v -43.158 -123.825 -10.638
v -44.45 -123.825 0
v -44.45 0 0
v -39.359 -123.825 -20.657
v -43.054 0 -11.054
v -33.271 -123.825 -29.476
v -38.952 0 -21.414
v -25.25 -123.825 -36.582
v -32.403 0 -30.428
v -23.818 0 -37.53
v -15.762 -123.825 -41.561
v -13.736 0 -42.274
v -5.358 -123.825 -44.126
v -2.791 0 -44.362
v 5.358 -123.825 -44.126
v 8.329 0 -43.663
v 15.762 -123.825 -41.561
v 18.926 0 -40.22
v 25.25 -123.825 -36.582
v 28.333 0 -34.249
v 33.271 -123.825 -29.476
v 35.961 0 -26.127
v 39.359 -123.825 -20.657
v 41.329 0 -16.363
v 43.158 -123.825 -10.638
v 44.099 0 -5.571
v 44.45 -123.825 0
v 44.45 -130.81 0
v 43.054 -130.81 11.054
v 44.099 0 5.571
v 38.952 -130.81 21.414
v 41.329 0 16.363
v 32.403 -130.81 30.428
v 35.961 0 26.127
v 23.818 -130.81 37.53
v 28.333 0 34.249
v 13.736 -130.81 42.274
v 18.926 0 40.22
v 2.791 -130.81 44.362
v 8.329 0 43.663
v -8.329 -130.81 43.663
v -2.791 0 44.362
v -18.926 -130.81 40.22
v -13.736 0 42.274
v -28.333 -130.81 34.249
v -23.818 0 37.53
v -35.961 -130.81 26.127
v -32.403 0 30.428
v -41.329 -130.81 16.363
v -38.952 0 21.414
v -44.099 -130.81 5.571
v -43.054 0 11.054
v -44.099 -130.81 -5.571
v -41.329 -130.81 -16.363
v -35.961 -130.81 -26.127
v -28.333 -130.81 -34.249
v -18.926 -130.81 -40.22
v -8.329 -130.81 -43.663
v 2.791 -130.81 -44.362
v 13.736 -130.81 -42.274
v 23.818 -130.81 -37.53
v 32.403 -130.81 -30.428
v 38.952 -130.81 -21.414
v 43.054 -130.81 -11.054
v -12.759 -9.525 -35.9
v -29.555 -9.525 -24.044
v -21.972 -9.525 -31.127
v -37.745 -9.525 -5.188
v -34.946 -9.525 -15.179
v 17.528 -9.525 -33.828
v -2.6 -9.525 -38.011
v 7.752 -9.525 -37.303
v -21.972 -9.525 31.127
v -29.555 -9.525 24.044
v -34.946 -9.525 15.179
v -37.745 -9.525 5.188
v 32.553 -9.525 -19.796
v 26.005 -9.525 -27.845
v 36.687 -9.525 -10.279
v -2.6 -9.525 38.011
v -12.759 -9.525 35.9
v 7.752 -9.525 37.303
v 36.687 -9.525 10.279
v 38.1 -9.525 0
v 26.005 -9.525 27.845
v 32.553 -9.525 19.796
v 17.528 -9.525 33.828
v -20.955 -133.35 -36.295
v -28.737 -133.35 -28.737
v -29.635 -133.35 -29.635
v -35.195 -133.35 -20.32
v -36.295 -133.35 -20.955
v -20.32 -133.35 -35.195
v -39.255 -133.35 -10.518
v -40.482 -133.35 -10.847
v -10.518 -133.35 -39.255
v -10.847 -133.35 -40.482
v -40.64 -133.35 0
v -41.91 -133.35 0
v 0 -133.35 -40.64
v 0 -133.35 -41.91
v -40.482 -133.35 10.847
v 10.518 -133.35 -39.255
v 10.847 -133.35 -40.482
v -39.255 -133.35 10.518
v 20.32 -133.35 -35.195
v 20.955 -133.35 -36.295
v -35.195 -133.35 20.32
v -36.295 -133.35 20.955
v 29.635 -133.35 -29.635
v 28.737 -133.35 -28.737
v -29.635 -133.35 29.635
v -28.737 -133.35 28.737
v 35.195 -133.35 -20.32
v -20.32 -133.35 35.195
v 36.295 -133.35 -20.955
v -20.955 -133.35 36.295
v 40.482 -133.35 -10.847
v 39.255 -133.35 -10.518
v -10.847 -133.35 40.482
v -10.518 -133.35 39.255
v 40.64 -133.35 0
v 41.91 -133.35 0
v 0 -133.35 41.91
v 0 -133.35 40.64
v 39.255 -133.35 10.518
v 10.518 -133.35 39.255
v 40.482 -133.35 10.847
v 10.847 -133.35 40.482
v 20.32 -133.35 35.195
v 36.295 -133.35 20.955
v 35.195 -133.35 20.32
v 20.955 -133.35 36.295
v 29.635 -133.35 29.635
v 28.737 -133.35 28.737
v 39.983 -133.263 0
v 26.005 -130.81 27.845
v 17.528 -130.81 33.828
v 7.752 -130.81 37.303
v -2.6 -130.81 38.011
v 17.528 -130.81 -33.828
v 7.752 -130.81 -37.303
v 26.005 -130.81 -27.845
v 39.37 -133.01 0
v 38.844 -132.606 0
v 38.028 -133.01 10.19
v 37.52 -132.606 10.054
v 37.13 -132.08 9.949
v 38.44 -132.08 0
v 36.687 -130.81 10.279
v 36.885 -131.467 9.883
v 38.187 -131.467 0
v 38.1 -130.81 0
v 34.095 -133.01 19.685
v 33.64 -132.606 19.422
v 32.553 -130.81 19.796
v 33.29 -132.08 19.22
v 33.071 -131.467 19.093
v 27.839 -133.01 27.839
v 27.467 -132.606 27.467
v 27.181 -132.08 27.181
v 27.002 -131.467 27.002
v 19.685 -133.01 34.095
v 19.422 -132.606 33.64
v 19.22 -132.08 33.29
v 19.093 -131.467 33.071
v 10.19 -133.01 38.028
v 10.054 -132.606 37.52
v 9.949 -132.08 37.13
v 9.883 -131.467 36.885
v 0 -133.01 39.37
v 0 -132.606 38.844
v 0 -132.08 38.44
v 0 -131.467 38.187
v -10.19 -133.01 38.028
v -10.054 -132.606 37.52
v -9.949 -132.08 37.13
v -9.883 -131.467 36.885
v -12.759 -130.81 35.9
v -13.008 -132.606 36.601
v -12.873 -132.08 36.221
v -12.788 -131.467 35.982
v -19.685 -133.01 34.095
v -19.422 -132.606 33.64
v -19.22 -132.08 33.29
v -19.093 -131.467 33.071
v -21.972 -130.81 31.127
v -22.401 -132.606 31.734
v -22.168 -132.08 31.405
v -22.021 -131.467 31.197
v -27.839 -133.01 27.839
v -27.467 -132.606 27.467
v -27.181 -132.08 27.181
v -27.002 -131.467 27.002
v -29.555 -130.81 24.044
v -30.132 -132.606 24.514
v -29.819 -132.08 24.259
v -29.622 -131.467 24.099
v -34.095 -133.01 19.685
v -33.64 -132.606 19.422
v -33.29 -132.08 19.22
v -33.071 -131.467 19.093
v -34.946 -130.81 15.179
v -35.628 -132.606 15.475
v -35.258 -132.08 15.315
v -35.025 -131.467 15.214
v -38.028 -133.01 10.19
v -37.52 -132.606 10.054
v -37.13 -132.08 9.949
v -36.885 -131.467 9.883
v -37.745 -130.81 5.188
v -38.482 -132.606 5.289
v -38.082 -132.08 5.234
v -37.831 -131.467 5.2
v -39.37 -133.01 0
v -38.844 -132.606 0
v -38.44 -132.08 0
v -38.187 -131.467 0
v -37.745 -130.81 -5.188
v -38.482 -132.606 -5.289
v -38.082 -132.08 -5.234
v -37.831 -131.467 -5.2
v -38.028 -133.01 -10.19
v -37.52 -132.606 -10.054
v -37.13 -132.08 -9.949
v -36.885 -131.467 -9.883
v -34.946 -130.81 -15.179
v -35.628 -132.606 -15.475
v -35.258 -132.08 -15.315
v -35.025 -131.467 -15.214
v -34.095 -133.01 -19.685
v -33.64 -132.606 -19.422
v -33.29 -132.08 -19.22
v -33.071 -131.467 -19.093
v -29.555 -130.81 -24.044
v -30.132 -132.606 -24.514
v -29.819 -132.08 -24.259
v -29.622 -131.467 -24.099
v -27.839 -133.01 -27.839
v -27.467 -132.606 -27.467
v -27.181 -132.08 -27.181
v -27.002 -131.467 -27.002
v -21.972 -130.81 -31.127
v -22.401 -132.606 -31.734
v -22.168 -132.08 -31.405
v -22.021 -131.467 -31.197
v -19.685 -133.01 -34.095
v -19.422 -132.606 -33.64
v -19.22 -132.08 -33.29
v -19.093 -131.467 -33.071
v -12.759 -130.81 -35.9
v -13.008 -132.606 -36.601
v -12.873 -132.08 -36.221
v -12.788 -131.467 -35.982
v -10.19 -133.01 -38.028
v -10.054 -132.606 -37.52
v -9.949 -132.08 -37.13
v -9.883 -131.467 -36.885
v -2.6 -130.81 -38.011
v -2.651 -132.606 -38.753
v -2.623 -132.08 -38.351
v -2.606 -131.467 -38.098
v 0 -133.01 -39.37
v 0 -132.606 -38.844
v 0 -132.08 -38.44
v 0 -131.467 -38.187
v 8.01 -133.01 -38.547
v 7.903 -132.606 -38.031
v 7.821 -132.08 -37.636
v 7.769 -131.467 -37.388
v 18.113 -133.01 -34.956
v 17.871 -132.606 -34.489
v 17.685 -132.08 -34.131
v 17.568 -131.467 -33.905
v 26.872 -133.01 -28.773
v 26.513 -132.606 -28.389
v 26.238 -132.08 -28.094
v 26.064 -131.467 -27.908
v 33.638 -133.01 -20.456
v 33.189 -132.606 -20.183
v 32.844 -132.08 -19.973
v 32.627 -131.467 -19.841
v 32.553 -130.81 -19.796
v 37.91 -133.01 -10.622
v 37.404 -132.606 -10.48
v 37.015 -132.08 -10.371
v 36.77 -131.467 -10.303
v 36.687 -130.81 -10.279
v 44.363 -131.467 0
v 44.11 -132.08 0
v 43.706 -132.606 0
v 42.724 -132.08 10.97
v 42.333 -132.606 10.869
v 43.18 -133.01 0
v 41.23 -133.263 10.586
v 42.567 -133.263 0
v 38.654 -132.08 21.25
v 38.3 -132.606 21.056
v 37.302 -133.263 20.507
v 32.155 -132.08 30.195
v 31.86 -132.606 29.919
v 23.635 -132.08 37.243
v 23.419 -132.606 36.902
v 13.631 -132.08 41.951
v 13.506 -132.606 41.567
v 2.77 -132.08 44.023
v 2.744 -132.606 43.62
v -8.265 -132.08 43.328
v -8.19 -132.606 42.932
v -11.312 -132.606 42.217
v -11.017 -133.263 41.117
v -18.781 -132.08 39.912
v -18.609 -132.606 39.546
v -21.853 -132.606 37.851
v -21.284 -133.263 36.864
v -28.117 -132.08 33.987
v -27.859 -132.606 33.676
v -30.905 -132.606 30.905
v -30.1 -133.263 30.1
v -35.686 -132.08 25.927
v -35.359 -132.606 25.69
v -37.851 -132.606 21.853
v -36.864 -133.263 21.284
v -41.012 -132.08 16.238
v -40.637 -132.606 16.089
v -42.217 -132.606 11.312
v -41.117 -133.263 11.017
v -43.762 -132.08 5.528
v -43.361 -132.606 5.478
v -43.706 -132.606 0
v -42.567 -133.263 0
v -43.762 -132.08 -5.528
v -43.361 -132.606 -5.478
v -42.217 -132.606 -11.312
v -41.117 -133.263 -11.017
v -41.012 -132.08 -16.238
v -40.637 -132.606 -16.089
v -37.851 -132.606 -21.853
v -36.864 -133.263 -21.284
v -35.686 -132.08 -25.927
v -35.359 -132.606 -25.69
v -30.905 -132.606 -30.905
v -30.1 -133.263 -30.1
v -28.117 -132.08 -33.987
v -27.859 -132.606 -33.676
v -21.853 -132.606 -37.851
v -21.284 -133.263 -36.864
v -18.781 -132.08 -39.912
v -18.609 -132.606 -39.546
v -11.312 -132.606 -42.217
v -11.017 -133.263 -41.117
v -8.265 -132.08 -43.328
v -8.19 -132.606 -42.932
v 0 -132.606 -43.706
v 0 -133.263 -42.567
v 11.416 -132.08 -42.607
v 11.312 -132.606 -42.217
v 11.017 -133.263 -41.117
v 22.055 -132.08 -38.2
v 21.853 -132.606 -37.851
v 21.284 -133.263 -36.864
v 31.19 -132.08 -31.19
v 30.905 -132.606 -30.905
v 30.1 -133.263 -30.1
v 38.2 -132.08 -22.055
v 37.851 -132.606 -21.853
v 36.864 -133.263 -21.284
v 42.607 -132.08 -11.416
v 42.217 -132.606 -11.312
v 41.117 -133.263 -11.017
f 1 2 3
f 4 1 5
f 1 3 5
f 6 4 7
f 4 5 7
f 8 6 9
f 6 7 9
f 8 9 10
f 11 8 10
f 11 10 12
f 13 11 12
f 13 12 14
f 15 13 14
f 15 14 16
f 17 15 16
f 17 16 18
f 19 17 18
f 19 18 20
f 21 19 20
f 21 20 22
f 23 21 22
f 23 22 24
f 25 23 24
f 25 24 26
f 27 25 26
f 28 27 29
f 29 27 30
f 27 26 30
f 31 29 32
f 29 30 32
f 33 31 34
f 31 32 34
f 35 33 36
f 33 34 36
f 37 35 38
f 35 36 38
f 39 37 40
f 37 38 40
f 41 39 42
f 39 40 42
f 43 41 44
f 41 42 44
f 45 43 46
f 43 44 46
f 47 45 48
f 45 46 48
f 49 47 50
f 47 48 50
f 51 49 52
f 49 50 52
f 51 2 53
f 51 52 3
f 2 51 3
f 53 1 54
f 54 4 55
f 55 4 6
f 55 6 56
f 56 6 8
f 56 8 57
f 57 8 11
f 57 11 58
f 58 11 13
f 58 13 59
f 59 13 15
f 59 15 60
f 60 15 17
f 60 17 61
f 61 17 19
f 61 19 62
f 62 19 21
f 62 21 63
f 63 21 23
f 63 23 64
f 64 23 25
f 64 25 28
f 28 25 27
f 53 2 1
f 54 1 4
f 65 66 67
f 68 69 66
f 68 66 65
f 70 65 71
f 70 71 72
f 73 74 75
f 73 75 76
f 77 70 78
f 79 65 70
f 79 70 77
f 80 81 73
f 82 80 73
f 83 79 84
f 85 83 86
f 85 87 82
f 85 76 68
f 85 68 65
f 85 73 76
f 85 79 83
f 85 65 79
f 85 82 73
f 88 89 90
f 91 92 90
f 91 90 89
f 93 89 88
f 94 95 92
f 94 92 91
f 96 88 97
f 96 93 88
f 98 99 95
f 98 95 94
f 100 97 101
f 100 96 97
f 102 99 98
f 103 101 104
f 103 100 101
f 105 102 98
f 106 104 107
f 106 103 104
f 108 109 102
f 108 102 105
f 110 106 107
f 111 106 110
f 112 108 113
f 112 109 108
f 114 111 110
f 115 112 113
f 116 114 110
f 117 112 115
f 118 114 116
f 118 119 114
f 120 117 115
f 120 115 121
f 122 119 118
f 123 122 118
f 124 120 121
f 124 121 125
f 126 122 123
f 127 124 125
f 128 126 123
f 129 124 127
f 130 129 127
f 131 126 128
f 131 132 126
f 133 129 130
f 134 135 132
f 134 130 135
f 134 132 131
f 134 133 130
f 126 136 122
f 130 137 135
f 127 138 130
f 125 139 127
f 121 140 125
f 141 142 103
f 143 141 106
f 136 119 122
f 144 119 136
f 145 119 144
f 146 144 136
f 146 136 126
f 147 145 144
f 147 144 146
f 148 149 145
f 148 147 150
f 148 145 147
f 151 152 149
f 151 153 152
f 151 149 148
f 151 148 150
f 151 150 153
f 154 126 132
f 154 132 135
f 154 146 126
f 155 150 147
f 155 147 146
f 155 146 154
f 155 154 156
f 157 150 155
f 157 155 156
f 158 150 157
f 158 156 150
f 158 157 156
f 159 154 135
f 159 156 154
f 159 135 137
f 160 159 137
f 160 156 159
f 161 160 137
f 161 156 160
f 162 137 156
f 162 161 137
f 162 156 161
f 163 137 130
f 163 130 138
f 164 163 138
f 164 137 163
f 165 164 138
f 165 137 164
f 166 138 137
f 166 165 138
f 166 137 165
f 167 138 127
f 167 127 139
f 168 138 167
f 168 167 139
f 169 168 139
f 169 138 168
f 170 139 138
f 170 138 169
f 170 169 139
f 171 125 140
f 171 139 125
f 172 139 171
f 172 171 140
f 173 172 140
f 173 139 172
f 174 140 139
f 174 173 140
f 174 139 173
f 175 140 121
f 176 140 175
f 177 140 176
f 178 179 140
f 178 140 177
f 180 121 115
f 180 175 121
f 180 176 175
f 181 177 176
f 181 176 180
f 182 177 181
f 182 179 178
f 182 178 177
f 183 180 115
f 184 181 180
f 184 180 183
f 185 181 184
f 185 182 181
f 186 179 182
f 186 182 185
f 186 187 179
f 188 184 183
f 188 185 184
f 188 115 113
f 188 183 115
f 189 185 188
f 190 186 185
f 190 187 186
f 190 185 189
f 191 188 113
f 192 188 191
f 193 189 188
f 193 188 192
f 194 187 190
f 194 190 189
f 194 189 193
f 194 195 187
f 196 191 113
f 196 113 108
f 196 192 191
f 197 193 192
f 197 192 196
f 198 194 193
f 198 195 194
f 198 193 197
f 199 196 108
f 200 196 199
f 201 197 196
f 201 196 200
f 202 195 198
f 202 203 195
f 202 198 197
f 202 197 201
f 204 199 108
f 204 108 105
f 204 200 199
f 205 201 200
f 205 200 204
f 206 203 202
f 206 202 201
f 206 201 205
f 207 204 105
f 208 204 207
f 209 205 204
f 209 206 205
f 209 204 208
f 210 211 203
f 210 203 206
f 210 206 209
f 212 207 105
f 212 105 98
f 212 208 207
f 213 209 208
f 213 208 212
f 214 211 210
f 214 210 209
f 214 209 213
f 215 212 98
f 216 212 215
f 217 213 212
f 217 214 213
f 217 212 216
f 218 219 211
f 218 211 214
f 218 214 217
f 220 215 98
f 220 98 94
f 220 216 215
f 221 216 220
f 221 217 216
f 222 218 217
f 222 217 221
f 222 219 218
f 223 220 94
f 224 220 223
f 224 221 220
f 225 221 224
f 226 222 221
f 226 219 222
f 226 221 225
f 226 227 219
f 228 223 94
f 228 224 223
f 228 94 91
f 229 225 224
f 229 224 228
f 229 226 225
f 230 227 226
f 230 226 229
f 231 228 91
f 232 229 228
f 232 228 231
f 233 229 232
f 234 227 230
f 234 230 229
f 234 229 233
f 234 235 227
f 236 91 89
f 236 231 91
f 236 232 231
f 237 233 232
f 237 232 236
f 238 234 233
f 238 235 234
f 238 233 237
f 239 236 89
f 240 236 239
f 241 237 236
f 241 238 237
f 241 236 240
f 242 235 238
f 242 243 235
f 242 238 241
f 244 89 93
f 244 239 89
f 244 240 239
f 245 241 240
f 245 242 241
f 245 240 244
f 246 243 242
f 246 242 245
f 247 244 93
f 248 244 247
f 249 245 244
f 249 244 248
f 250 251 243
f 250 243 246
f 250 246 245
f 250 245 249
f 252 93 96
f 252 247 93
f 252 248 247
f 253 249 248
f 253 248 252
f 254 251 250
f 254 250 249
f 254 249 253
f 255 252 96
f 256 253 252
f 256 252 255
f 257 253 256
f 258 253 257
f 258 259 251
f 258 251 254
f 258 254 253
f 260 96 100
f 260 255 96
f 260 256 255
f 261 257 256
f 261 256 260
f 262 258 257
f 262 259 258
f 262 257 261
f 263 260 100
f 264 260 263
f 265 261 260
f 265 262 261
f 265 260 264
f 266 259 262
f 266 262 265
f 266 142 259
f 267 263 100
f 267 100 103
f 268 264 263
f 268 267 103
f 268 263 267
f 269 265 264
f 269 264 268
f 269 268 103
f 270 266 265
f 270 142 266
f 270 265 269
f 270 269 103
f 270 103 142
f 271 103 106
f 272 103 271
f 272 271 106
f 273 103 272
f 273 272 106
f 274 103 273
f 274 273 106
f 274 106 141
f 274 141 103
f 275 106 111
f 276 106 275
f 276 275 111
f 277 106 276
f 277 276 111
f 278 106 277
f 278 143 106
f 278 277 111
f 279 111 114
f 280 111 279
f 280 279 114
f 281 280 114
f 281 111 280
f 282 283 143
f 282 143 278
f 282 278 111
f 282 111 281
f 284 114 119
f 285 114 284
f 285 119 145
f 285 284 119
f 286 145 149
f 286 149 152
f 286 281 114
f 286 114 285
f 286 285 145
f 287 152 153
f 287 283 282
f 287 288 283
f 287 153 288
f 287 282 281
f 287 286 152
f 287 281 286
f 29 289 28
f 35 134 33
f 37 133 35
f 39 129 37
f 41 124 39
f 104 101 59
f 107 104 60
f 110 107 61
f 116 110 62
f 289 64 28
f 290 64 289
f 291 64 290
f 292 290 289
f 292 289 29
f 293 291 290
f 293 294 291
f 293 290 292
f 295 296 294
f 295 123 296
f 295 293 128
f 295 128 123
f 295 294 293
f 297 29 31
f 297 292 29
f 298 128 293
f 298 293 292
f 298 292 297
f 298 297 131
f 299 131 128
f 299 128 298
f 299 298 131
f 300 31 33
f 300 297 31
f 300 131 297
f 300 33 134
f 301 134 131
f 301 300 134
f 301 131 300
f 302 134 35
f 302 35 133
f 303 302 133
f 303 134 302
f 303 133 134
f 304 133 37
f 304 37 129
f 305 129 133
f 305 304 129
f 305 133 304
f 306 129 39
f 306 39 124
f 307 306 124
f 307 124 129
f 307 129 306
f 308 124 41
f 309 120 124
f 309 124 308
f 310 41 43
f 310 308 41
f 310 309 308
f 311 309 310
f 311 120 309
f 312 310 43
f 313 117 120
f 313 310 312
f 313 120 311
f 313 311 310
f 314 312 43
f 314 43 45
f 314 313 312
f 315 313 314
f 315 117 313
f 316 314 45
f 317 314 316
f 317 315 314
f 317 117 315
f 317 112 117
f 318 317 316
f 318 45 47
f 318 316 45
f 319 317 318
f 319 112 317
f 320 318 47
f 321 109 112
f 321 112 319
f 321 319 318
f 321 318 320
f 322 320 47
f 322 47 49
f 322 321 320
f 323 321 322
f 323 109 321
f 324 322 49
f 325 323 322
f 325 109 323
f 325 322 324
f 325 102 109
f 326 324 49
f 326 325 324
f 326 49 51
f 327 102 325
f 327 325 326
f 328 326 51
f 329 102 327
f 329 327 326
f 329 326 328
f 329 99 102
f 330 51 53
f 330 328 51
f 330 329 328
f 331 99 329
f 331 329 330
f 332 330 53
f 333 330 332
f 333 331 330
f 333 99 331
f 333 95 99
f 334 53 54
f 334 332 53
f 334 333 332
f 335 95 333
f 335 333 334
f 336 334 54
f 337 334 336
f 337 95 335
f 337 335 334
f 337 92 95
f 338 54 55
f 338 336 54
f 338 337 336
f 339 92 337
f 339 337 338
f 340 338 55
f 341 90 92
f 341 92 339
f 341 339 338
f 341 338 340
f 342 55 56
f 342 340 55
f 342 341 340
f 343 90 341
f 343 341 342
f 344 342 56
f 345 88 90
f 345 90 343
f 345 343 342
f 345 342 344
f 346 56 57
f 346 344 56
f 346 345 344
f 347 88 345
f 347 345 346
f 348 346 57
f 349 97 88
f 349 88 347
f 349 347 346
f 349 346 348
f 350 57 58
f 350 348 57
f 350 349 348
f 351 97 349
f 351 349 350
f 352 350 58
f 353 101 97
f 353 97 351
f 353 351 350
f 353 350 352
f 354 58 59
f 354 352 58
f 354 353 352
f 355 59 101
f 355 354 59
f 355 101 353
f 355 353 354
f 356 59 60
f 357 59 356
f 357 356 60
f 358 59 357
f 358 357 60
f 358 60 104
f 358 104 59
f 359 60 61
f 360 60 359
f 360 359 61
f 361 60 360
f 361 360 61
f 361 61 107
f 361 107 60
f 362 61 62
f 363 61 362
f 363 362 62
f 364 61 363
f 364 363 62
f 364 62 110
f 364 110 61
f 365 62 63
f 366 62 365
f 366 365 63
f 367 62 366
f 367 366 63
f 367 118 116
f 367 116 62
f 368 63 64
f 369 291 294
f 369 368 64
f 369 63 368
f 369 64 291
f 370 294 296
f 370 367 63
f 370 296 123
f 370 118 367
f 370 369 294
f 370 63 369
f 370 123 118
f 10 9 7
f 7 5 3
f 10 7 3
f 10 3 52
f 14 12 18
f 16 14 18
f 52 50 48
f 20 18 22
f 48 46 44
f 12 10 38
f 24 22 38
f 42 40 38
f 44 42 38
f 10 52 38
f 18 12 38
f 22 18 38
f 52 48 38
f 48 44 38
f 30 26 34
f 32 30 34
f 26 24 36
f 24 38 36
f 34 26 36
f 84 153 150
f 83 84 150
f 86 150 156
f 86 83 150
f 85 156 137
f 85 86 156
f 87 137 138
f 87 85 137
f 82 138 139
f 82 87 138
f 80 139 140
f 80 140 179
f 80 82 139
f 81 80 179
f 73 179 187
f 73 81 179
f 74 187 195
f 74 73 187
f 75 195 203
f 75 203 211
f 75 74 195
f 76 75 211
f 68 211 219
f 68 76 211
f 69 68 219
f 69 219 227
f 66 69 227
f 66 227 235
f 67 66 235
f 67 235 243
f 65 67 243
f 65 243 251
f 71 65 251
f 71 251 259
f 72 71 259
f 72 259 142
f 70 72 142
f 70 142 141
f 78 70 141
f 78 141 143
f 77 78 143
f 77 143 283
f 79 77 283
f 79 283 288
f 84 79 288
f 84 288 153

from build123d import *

# Parameters (mm, degrees)
F1_DEPTH    = 123.825
F2_DEPTH    = 25.4
F1_FACE_R   = 44.45
F1_FACE_R_2 = 38.1
F3_DEPTH    = 9.525
F4_R        = 2.54


with BuildPart() as f1:
    # F0 (on Front) → F1 (new body)
    with BuildSketch(Plane.XZ):
        with BuildLine():
            ThreePointArc((44.45, 0), (0, 44.45), (-44.45, 0))
            ThreePointArc((-44.45, 0), (0, -44.45), (44.45, 0))
        make_face()
        with BuildLine():
            ThreePointArc((-38.1, 0), (0, 38.1), (38.1, 0))
            ThreePointArc((38.1, 0), (0, -38.1), (-38.1, 0))
        make_face(mode=Mode.SUBTRACT)
    extrude(amount=F1_DEPTH)

    # F0 (on Front) → F2 (join)
    with BuildSketch(Plane.XZ):
        with BuildLine():
            ThreePointArc((44.45, 0), (0, 44.45), (-44.45, 0))
            ThreePointArc((-44.45, 0), (0, -44.45), (44.45, 0))
        make_face()
        with BuildLine():
            ThreePointArc((-38.1, 0), (0, 38.1), (38.1, 0))
            ThreePointArc((38.1, 0), (0, -38.1), (-38.1, 0))
        make_face(mode=Mode.SUBTRACT)
    extrude(amount=F2_DEPTH)

    # F0 (on Front) + F1_face (on face) → F3 (join)
    with BuildSketch(Plane.XZ):
        with BuildLine():
            ThreePointArc((-38.1, 0), (0, -38.1), (38.1, 0))
            ThreePointArc((38.1, 0), (0, 38.1), (-38.1, 0))
        make_face()
    with BuildSketch(Plane.XZ.offset(123.825)):
        Circle(F1_FACE_R)
        Circle(F1_FACE_R_2, mode=Mode.SUBTRACT)
    extrude(amount=F3_DEPTH)

    # F4
    f4_edges = [f1.edges().sort_by_distance(p)[0] for p in [
        (-44.45, -133.35, 0),
        (-38.1, -133.35, 0),
    ]]
    fillet(f4_edges, radius=F4_R)


solid = f1.part
